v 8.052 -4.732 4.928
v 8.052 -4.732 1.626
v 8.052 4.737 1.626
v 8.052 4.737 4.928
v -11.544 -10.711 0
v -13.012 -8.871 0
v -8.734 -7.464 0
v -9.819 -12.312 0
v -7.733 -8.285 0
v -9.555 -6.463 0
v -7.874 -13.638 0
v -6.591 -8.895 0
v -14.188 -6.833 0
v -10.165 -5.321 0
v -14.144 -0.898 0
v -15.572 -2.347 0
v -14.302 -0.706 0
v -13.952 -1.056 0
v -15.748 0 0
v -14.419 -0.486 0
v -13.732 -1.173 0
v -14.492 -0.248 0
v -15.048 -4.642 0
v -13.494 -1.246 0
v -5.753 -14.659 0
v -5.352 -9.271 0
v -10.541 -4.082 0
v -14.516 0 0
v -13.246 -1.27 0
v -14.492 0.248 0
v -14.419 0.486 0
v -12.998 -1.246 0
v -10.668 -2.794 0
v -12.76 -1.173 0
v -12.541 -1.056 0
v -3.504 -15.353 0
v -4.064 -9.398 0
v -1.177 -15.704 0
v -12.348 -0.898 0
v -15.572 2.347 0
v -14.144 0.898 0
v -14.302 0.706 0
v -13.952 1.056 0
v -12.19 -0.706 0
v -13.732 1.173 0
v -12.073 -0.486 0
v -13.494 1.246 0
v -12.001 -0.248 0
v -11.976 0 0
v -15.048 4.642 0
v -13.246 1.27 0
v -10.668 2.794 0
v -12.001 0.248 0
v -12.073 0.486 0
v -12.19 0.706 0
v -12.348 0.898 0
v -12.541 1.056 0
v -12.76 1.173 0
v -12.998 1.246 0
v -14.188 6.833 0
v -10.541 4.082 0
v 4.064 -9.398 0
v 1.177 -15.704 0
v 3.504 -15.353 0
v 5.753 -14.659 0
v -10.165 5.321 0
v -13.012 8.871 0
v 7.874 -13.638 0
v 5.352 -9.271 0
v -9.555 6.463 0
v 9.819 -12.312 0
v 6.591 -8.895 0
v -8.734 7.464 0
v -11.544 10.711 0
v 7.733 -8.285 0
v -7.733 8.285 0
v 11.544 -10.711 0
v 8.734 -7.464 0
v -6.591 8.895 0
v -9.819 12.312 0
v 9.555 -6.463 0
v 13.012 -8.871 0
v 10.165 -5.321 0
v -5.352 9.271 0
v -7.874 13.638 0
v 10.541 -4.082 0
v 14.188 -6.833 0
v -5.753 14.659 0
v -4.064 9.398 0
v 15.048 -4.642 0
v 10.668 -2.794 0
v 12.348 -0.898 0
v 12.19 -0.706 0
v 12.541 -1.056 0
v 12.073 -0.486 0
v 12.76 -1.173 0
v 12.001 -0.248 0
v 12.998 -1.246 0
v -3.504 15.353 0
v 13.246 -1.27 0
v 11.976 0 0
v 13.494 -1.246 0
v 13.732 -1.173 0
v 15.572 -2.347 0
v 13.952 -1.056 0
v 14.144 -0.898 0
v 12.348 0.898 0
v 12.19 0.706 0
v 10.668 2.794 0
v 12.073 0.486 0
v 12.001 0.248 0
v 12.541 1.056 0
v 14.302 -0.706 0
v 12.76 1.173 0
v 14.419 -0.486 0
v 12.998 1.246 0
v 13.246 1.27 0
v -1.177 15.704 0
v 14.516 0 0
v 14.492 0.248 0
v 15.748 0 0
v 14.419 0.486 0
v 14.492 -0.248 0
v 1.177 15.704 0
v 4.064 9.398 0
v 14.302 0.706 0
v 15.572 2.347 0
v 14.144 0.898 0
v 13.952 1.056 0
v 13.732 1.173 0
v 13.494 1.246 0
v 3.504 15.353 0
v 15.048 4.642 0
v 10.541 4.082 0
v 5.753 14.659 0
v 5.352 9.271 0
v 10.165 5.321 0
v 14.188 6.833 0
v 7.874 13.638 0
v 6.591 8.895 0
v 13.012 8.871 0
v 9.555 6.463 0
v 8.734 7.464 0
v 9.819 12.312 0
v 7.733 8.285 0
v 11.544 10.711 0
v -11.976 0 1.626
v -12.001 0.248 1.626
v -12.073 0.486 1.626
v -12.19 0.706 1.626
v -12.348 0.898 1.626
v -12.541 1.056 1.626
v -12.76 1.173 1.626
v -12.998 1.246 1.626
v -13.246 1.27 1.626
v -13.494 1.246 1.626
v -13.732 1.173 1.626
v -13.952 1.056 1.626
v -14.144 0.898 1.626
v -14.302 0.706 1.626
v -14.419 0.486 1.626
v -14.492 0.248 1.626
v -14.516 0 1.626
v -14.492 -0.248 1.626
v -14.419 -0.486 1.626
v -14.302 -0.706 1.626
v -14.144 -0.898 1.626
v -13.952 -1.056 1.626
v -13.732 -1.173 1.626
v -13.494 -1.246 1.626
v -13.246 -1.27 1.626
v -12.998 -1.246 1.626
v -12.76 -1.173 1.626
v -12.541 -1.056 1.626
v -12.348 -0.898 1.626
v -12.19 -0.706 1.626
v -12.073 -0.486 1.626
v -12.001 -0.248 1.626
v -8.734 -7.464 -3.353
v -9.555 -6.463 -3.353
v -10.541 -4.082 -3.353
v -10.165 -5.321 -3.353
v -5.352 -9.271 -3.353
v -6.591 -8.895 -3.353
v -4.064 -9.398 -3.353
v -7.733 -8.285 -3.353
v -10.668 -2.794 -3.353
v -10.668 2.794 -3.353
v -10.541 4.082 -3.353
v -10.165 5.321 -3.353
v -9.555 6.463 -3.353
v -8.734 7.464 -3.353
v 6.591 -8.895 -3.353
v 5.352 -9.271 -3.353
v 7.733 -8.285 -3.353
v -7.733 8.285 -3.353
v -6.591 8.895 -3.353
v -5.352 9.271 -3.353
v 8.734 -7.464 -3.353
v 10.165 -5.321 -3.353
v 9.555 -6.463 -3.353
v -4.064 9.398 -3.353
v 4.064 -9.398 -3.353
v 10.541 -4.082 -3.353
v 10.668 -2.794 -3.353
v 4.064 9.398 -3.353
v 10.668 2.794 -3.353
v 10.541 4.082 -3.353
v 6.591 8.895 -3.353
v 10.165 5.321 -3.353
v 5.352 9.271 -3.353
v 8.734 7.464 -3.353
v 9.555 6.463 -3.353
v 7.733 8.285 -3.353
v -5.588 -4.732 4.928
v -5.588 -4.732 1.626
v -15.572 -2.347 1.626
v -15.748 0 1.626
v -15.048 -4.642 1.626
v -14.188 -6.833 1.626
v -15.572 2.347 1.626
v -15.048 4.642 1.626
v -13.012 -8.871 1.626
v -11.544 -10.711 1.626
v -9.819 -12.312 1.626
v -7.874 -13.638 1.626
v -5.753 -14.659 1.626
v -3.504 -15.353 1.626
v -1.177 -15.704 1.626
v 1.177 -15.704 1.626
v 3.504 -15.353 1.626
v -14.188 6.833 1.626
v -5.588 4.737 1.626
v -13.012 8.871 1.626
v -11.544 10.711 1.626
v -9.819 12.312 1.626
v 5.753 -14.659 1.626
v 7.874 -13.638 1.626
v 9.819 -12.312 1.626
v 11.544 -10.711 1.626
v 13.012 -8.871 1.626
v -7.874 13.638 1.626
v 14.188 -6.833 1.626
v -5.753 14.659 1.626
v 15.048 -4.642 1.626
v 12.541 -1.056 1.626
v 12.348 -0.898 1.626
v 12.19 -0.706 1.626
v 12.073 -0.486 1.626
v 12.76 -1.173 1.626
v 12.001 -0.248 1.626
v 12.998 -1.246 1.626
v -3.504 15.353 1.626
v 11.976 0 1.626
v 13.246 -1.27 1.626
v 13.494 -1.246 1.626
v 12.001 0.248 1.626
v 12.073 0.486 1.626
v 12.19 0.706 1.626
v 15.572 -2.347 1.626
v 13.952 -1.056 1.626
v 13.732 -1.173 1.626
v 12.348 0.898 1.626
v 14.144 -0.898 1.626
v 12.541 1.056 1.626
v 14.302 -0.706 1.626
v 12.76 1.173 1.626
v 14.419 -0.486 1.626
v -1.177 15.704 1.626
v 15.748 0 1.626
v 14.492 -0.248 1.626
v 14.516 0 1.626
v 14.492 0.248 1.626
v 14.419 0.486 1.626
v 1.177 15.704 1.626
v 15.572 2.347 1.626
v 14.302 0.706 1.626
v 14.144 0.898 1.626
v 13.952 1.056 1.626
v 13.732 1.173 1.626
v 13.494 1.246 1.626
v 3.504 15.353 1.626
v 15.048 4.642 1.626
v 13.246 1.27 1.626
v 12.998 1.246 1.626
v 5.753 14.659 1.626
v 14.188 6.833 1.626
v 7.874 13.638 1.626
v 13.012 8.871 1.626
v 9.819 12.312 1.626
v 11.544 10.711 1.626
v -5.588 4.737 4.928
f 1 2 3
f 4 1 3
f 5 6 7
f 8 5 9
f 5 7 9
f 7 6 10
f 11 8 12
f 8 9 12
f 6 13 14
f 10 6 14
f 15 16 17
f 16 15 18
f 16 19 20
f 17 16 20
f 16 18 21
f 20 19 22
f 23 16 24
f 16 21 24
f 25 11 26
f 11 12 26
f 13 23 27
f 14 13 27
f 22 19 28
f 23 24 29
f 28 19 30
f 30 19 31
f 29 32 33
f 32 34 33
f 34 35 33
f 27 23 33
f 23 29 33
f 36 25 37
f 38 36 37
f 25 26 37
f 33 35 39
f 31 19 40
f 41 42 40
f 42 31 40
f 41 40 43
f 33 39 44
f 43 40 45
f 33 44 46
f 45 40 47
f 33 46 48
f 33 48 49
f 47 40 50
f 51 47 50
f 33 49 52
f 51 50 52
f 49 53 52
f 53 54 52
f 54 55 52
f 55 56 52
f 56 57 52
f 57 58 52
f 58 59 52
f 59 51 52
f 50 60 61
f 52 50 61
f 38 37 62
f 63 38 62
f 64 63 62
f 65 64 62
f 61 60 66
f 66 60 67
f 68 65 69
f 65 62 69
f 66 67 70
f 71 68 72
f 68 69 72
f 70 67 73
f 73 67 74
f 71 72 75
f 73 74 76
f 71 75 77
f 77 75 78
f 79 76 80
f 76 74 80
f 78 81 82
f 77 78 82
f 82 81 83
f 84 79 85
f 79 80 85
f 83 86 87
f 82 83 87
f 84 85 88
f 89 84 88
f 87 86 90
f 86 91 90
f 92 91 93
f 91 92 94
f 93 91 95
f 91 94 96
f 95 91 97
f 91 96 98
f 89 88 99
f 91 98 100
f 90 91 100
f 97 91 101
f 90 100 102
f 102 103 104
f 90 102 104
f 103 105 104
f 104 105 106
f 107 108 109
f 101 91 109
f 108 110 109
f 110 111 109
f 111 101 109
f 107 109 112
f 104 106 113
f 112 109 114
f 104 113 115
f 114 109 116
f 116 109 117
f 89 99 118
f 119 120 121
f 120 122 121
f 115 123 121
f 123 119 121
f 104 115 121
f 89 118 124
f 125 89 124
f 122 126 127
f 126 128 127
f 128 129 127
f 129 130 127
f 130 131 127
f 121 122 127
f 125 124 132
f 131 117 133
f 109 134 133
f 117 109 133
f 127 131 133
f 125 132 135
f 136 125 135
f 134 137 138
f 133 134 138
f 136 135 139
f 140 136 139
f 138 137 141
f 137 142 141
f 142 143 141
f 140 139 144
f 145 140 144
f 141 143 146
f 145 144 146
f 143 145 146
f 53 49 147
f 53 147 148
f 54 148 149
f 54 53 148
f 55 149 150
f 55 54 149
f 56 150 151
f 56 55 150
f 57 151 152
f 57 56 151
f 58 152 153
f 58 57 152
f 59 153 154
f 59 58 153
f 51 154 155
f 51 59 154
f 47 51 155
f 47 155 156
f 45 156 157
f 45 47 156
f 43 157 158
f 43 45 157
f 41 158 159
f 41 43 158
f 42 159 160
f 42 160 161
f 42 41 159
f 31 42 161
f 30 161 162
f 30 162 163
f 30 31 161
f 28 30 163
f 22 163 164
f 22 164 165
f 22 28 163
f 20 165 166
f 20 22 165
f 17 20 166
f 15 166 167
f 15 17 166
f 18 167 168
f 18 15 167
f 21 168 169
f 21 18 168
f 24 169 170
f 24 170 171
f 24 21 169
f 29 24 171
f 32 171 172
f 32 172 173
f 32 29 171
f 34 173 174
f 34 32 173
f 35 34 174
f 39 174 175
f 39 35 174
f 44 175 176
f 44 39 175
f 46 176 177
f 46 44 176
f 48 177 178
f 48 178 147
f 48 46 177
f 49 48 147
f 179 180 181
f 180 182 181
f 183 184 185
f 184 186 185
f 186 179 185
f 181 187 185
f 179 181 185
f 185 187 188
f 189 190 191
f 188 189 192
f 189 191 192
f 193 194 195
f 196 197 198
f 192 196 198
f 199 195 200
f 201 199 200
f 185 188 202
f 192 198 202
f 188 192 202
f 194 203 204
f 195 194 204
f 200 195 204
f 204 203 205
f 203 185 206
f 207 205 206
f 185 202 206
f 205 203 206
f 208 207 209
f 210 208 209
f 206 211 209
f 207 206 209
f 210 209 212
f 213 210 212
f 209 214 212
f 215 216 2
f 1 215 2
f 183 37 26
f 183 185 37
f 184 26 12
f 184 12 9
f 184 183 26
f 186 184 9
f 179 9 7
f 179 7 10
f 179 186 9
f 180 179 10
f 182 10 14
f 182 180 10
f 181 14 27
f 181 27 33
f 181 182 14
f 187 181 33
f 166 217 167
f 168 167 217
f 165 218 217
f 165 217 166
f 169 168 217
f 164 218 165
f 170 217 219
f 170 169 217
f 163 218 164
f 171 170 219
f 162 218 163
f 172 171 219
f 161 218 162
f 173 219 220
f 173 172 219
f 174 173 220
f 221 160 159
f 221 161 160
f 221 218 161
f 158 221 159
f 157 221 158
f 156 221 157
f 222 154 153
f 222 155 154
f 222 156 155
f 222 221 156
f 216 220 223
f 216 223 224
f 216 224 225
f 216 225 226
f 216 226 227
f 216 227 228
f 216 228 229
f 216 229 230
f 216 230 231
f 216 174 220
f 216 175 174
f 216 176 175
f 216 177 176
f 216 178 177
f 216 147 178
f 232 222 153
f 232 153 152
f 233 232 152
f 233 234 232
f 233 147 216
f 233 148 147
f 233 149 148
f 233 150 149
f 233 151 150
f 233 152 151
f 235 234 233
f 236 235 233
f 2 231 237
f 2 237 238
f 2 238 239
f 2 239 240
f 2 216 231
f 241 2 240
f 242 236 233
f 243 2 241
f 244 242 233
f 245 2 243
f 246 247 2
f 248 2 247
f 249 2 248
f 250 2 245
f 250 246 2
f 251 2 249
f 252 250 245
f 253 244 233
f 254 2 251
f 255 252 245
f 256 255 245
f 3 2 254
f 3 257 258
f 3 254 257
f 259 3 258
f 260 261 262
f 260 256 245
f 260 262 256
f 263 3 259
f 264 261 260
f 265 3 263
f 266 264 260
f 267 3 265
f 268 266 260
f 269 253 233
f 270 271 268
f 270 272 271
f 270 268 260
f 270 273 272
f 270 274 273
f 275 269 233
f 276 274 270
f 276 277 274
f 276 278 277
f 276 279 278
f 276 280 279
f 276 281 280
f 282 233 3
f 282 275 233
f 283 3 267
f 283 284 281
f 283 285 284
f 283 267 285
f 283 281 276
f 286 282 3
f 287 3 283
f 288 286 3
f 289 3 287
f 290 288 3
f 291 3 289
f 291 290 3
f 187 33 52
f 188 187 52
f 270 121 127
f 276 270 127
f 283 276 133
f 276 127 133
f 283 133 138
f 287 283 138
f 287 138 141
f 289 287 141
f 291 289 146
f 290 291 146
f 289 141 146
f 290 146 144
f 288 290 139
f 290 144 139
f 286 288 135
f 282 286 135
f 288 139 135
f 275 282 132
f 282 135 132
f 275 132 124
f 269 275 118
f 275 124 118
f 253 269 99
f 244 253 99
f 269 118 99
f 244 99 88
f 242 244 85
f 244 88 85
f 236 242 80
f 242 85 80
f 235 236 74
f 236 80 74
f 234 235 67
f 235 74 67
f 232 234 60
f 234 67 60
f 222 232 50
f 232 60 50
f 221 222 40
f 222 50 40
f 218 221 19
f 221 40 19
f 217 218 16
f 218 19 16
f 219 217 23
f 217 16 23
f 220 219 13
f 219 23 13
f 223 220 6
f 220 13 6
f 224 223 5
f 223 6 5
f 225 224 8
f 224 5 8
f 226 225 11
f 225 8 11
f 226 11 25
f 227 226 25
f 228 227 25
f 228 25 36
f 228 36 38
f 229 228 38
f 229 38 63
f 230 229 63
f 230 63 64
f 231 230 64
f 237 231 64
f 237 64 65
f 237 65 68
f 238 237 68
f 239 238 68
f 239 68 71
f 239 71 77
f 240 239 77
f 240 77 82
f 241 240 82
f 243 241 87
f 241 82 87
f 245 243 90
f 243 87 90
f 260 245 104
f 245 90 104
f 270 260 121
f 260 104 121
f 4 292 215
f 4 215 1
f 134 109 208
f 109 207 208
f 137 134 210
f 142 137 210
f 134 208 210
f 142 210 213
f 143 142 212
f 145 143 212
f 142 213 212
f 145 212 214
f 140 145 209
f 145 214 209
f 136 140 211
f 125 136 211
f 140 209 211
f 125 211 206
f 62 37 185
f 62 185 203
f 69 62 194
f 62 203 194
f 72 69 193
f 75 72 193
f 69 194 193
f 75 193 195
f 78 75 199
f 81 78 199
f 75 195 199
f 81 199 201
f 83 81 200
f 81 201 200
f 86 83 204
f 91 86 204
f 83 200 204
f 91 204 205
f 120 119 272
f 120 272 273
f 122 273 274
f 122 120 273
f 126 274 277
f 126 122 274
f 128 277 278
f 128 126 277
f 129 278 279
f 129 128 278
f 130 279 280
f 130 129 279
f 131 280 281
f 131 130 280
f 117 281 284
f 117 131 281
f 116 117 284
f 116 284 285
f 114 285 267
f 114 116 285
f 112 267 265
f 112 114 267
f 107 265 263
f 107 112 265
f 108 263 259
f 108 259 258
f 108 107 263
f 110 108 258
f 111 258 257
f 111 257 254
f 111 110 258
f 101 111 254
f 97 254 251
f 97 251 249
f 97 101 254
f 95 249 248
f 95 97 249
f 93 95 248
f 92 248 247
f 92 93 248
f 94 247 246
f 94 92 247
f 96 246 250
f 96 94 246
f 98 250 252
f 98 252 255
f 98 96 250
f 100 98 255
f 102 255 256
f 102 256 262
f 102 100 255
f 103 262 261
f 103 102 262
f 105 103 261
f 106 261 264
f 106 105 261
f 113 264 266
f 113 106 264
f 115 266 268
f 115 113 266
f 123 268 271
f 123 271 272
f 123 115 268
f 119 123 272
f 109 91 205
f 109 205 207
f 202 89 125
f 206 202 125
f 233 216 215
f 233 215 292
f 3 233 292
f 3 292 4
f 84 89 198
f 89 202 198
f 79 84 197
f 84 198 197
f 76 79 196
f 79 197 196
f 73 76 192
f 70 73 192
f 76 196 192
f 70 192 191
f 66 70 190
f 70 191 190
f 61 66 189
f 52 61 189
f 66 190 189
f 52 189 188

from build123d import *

# Parameters (mm, degrees)
F0_R     = 15.748
F0_R_2   = 1.27
F1_DEPTH = 1.6256
F2_W     = 13.6398
F2_H     = 9.46912
F3_DEPTH = 3.302
F4_W     = 21.336
F4_H     = 18.796
F5_DEPTH = 3.3528
F6_R     = 6.604


with BuildPart() as f1:
    # F0 (on Top) → F1 (new body)
    with BuildSketch(Plane.XY):
        Circle(F0_R)
        with Locations((-13.2461, 0)):
            Circle(F0_R_2, mode=Mode.SUBTRACT)
        with Locations((13.2461, 0)):
            Circle(F0_R_2, mode=Mode.SUBTRACT)
    extrude(amount=F1_DEPTH)

    # F2 (on face) → F3 (join)
    with BuildSketch(Plane.XY.offset(1.6256)):
        with Locations((1.2319, 0.00254)):
            Rectangle(F2_W, F2_H)
    extrude(amount=F3_DEPTH)

    # F4 (on Top) → F5 (join)
    with BuildSketch(Plane.XY):
        Rectangle(F4_W, F4_H)
    extrude(amount=-F5_DEPTH)

    # F6
    f6_edges = [f1.edges().sort_by_distance(p)[0] for p in [
        (10.668, -9.398, -1.6764),
        (-10.668, -9.398, -1.6764),
        (-10.668, 9.398, -1.6764),
        (10.668, 9.398, -1.6764),
    ]]
    fillet(f6_edges, radius=F6_R)


solid = f1.part
